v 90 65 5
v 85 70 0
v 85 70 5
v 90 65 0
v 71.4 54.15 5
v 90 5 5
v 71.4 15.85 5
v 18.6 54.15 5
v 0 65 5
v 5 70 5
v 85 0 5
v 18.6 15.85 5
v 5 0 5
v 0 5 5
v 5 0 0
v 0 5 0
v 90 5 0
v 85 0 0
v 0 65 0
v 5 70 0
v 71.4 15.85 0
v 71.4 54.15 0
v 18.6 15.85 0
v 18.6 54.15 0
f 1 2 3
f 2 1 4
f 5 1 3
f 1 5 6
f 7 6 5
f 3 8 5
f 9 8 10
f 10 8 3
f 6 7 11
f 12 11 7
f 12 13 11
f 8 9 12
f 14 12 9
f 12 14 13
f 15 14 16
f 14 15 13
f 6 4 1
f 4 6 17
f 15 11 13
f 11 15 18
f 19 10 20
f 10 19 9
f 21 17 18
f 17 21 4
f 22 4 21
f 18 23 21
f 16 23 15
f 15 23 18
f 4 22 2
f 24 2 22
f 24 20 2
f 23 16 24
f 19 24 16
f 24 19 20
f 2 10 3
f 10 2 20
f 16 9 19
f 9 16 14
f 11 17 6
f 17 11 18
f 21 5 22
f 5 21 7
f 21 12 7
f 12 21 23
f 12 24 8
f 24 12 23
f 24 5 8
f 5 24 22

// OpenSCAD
$fn = 32;

// ----------------------------------------------------------------------
// Windowed plate: 1 voids, 90 x 70 x 5 mm
// ----------------------------------------------------------------------

// --- parameters (mm) ---
plate_l = 90;             // plate length, X
plate_w = 70;             // plate width, Y
plate_t = 5;              // plate thickness, Z
edge_margin = 12;         // wall from the plate edge to any window
win1_l = 52.8;            // window length
win1_w = 38.3;            // window width
depth_1 = 5;              // depth of void 1 (full thickness = through)
corner_c = 5;             // corner chamfer of the plate
fit_tol = 0.1;            // declared fit tolerance (prompt contract)
free_tol = 0.3;           // declared free tolerance (prompt contract)

profile = [[5, 0], [85, 0], [90, 5], [90, 65], [85, 70], [5, 70], [0, 65], [0, 5]];  // primary outline, 8 points, counter clockwise
void_1 = [[18.6, 15.85], [71.4, 15.85], [71.4, 54.15], [18.6, 54.15]];  // large central window, 4 points

// --- the one profile operation ---
difference() {
  linear_extrude(height = plate_t) polygon(points = profile);
  translate([0, 0, -1])
    linear_extrude(height = plate_t + 2) polygon(points = void_1);
}
